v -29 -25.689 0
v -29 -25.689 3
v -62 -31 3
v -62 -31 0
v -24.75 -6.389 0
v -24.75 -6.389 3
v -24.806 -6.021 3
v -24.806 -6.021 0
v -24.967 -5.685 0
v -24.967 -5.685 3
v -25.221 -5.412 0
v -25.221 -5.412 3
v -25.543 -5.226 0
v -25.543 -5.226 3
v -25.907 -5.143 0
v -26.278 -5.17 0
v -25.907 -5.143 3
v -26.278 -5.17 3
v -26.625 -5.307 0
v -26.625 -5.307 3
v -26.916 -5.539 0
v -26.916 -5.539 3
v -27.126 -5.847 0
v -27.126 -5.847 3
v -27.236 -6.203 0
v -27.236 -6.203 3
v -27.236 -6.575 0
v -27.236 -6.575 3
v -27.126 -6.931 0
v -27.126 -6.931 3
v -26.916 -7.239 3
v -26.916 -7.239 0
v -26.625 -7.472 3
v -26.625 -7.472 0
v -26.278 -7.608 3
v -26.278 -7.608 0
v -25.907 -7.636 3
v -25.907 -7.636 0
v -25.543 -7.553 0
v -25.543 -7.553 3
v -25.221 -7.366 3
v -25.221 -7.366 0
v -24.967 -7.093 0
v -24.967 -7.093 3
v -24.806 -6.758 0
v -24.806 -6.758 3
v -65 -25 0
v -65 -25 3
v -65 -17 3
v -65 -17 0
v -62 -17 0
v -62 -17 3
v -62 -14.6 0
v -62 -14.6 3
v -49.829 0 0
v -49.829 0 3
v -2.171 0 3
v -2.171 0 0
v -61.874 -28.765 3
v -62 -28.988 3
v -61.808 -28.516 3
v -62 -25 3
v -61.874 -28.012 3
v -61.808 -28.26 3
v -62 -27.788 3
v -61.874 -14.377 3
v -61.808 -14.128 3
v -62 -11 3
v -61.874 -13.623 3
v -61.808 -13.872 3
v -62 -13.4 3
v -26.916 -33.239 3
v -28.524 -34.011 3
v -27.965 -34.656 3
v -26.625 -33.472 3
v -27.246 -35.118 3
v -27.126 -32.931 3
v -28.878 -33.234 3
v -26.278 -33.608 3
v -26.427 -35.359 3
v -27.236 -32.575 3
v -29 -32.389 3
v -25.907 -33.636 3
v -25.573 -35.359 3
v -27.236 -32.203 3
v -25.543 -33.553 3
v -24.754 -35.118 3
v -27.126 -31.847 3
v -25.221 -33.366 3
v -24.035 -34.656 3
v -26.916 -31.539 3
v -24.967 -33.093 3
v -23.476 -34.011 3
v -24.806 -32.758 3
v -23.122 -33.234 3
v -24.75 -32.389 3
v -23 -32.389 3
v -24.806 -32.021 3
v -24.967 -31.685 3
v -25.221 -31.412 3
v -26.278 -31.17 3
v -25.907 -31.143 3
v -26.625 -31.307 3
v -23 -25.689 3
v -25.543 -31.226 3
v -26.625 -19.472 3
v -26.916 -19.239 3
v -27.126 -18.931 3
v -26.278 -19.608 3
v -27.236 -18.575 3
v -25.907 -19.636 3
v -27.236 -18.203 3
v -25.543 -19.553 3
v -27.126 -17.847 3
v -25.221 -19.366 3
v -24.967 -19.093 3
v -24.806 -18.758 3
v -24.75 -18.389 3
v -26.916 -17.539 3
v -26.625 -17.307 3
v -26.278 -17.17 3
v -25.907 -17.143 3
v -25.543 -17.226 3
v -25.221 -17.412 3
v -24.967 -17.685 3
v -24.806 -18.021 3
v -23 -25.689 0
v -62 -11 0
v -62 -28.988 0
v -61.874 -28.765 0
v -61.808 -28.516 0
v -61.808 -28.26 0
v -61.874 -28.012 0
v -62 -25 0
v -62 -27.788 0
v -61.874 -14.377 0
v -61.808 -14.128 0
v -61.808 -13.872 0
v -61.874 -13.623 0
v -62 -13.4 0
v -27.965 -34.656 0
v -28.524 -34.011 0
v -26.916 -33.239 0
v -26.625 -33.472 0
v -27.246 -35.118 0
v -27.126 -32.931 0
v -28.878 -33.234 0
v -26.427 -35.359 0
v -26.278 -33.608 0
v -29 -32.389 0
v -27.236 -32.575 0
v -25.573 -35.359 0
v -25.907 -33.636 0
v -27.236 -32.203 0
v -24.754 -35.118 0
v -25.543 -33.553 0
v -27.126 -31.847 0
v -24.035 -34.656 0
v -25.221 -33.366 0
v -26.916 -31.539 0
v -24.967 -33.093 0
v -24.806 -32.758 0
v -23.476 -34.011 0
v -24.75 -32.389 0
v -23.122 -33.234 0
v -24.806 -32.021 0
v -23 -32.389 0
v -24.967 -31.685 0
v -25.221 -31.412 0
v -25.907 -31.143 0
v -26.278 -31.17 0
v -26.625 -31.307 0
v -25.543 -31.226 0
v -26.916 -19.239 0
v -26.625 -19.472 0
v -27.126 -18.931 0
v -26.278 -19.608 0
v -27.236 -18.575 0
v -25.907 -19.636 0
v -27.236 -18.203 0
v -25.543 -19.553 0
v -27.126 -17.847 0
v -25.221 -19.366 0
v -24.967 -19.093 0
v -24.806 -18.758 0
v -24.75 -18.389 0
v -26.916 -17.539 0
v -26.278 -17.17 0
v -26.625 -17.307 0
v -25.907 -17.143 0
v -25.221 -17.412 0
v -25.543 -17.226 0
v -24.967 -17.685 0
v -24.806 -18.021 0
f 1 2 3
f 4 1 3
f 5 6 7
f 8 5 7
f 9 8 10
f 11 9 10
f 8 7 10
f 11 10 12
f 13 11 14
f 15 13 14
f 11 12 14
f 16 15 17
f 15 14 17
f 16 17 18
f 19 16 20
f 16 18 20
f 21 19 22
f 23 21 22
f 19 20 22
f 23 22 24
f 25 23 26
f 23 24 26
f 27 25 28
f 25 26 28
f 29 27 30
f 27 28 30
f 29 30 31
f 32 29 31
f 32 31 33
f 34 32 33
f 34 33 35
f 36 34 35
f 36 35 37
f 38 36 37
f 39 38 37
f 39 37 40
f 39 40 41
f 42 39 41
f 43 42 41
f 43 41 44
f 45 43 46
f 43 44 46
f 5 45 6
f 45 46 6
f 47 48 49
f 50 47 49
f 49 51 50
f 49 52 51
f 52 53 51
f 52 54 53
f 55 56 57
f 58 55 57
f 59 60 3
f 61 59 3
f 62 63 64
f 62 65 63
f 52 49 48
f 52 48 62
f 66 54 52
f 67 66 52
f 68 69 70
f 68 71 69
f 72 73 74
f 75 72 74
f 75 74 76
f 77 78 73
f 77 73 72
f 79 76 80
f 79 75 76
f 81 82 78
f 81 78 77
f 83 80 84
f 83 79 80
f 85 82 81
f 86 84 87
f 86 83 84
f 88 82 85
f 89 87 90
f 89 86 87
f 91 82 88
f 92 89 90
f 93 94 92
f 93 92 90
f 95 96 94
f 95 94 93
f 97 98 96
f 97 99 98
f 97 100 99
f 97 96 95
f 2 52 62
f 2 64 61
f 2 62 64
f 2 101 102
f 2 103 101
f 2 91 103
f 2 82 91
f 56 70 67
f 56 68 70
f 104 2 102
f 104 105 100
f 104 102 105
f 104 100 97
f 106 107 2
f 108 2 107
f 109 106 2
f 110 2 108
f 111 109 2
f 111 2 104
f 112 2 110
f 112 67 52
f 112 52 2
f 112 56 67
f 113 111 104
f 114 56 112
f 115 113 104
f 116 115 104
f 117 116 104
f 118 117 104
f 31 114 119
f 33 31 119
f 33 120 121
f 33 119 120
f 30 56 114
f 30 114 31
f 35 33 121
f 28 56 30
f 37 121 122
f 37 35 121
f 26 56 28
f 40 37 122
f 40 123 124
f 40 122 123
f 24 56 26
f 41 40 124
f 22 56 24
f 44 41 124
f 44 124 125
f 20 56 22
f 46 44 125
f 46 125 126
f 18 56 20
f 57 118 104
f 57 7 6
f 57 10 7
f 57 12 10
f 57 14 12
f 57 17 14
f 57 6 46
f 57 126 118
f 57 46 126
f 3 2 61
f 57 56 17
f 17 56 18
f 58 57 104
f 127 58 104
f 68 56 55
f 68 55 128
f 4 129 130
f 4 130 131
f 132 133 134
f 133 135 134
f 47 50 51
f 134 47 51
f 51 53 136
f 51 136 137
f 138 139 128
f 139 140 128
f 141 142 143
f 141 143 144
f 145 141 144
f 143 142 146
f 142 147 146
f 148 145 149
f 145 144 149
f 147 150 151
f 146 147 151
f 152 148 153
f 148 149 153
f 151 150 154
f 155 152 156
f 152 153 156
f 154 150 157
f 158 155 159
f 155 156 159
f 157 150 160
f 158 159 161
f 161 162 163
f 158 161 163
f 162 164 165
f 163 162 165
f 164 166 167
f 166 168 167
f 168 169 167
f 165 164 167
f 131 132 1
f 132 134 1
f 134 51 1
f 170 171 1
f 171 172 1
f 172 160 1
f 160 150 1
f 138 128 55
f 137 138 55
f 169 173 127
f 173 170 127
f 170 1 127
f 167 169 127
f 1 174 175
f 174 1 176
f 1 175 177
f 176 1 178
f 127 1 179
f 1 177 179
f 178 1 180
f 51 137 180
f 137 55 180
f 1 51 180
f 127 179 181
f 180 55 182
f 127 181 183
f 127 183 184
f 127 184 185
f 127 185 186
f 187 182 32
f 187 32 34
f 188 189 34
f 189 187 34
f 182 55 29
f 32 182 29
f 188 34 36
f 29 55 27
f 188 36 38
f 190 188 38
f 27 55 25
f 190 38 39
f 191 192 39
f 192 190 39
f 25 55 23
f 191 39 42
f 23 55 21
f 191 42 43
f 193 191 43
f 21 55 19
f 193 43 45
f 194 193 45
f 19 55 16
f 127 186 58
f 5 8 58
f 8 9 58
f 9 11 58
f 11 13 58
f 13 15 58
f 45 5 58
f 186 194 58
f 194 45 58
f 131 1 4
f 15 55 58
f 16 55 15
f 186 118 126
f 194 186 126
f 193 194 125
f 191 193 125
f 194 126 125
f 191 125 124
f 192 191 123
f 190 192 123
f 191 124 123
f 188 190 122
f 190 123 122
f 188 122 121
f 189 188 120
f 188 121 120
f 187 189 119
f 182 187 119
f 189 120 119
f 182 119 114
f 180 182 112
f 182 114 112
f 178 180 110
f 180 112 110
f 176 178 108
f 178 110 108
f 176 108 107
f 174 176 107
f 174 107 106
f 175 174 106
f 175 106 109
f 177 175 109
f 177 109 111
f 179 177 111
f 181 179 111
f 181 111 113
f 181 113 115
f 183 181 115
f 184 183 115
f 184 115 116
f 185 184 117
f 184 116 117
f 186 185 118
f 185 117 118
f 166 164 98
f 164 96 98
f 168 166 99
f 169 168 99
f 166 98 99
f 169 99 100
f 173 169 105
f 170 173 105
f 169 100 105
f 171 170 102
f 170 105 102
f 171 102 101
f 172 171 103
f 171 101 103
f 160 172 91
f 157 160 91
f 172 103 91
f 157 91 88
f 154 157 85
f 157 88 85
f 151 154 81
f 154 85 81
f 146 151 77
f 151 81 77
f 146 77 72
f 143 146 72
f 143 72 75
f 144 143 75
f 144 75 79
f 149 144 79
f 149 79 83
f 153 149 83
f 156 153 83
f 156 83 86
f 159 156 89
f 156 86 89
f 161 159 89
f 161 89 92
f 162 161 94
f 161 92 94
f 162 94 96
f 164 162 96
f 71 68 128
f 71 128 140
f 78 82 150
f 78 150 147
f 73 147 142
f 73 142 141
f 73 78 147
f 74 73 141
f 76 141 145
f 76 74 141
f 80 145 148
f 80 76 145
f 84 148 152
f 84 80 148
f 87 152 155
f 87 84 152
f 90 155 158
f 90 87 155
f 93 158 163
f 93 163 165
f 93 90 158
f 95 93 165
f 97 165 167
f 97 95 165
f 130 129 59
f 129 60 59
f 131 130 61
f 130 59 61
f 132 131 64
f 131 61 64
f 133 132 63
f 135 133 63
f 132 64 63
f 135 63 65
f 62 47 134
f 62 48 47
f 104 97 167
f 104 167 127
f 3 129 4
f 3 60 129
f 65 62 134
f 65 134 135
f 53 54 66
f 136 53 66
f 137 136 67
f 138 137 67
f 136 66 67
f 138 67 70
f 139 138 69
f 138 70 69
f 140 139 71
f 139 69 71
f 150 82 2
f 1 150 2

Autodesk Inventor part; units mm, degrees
ref_plane "YZ Plane" through (0, 0, 0) normal (1, 0, 0) x (0, 1, 0)
ref_plane "XZ Plane" through (0, 0, 0) normal (0, 1, 0) x (-1, 0, 0)
ref_plane "XY Plane" through (0, 0, 0) normal (0, 0, 1) x (1, 0, 0)
sketch "スケッチ1" plane through (0, 0, 0) normal (0, 0, 1) x (1, 0, 0)
  line L0 (0, 0) -> (-65, 0)
  line L1 (-65, 0) -> (-65, -60)
  line L2 (-65, -60) -> (0, -60)
  line L3 (0, -60) -> (0, 0)
  dimension "d0" = 65
  dimension "d1" = 60
extrude "押し出し1" add sketch "スケッチ1" along normal blind 3
sketch "スケッチ2" plane through (0, 0, 3) normal (0, 0, 1) x (1, 0, 0)
  line L0 (-29, -25.6891) -> (-49.829, 0)
  line L1 (-2.171, 0) -> (-23, -25.6891)
  line L2 (-62, -31) -> (-65, -31)
  line L3 (-65, -31) -> (-65, -25)
  line L4 (-65, -25) -> (-62, -25)
  line L5 (-62, -25) -> (-62, -31)
  line L6 (-62, -17) -> (-65, -17)
  line L7 (-65, -17) -> (-65, -11)
  line L8 (-65, -11) -> (-62, -11)
  line L9 (-62, -11) -> (-62, -17)
  line L10 (-65, 4) -> (-62, 4)
  line L11 (-62, 4) -> (-62, 0)
  line L12 (-62, 0) -> (-65, 0)
  line L13 (-65, -4) -> (-65, 0)
  line L14 (-62, -4) -> (-65, -4)
  line L15 (-62, 0) -> (-62, -4)
  line L16 (-65, 0) -> (-65, 4)
  line L17 (-65, -40) -> (-62, -40)
  line L18 (0, 0) -> (0, -60) projected
  line L19 (0, -60) -> (-65, -60) projected
  line L20 (-65, -60) -> (-65, 0) projected
  line L21 (-65, 0) -> (0, 0) projected
  line L22 (-49.829, 0) -> (-62, -11)
  arc A0 (-29, -32.3891) -> (-23, -32.3891) centre (-26, -32.3891) ccw
  line L23 (-26, -32.3891) -> (-26, -29.3891) construction
  circle A1 centre (-26, -32.3891) radius 1.25
  line L24 (-23, -32.3891) -> (-23, -25.6891)
  line L25 (-29, -32.3891) -> (-29, -25.6891)
  circle A2 centre (-26, -18.3891) radius 1.25
  circle A3 centre (-26, -6.3891) radius 1.25
  line L26 (-29, -25.6891) -> (-62, -31)
  dimension "d4" = 6
  dimension "d5" = 2.5
  dimension "d6" = 3
  dimension "d7" = 2.5
  dimension "d8" = 2.5
  dimension "d9" = 14
  dimension "d10" = 26
extrude "押し出し2" cut sketch "スケッチ2" against normal blind 3 contours L26 L5 L4 L20 L6 L9 L22 L0 | L0 L21 L1 L24 A0 L25 keep common part
sketch "スケッチ3" plane through (0, 0, 3) normal (0, 0, 1) x (1, 0, 0)
  circle A0 centre (-26, -6.3891) radius 1.25 projected
  circle A1 centre (-26, -18.3891) radius 1.25 projected
  circle A2 centre (-26, -32.3891) radius 1.25 projected
  line L0 (-62, -25) -> (-65, -25) projected
  line L1 (-65, -25) -> (-65, -17) projected
  line L2 (-65, -17) -> (-62, -17) projected
  line L3 (-62, -17) -> (-62, -11) projected
  line L4 (-62, -11) -> (-49.829, 0) projected
  line L5 (-49.829, 0) -> (-2.171, 0) projected
  line L6 (-2.171, 0) -> (-23, -25.6891) projected
  line L7 (-23, -25.6891) -> (-23, -32.3891) projected
  arc A3 (-29, -32.3891) -> (-23, -32.3891) centre (-26, -32.3891) ccw projected
  line L8 (-29, -32.3891) -> (-29, -25.6891) projected
  line L9 (-29, -25.6891) -> (-62, -31) projected
  line L10 (-62, -31) -> (-62, -25) projected
  arc A4 (-62, -28.9881) -> (-62, -27.7881) centre (-62.8, -28.3881) ccw
  arc A5 (-62, -14.6) -> (-62, -13.4) centre (-62.8, -14) ccw
  point P0 (0, 0)
  dimension "d13" = 2
  dimension "d14" = 2
  dimension "d15" = 3
  dimension "d16" = 3.3881
  dimension "d17" = 0.8
extrude "押し出し3" cut sketch "スケッチ3" against normal blind 3 contours A4 L10 | L3 A5
sketch "スケッチ4" plane through (0, 0, 3) normal (0, 0, 1) x (1, 0, 0)
  circle A0 centre (-26, -6.3891) radius 1.25 projected
  circle A1 centre (-26, -18.3891) radius 1.25 projected
  circle A2 centre (-26, -32.3891) radius 1.25 projected
  line L0 (-29, -32.3891) -> (-29, -25.6891) projected
  line L1 (-29, -25.6891) -> (-62, -31) projected
  line L2 (-62, -31) -> (-62, -28.9881) projected
  arc A3 (-62, -28.9881) -> (-62, -27.7881) centre (-62.8, -28.3881) ccw projected
  line L3 (-62, -27.7881) -> (-62, -25) projected
  line L4 (-62, -25) -> (-65, -25) projected
  line L5 (-65, -25) -> (-65, -17) projected
  line L6 (-65, -17) -> (-62, -17) projected
  line L7 (-62, -17) -> (-62, -14.6) projected
  arc A4 (-62, -14.6) -> (-62, -13.4) centre (-62.8, -14) ccw projected
  line L8 (-62, -13.4) -> (-62, -11) projected
  line L9 (-62, -11) -> (-49.829, 0) projected
  line L10 (-49.829, 0) -> (-2.171, 0) projected
  line L11 (-2.171, 0) -> (-23, -25.6891) projected
  line L12 (-23, -25.6891) -> (-23, -32.3891) projected
  arc A5 (-29, -32.3891) -> (-23, -32.3891) centre (-26, -32.3891) ccw projected
  line L13 (-58, -25) -> (-61, -25)
  line L14 (-61, -25) -> (-61, -17)
  line L15 (-61, -17) -> (-58, -17)
  line L16 (-65, -17) -> (-65, -25) projected
  line L17 (-62, -25) -> (-65, -25) projected
  circle A6 centre (-58.8, -28.3881) radius 1
  circle A7 centre (-58.8, -14) radius 1
  arc A8 (-62, -14.6) -> (-62, -13.4) centre (-62.8, -14) ccw projected
  line L18 (-49.829, 0) -> (-58, -11)
  line L19 (-58, -31) -> (-29, -25.6891)
  line L20 (-29, -25.6891) -> (-49.829, 0)
  line L21 (-58, -31) -> (-58, -28.9881)
  line L22 (-58, -27.7881) -> (-58, -25)
  line L23 (-58, -17) -> (-58, -14.6)
  line L24 (-58, -13.4) -> (-58, -11)
  dimension "d26" = 3
  dimension "d27" = 6
  dimension "d28" = 6
  dimension "d29" = 4
sketch "スケッチ5" plane through (0, 0, 3) normal (0, 0, 1) x (1, 0, 0)
  circle A0 centre (-26, -6.3891) radius 1.25 projected
  circle A1 centre (-26, -18.3891) radius 1.25 projected
  circle A2 centre (-26, -32.3891) radius 1.25 projected
  line L0 (-29, -32.3891) -> (-29, -25.6891) projected
  line L1 (-29, -25.6891) -> (-62, -31) projected
  line L2 (-62, -31) -> (-62, -28.9881) projected
  arc A3 (-62, -28.9881) -> (-62, -27.7881) centre (-62.8, -28.3881) ccw projected
  line L3 (-62, -27.7881) -> (-62, -25) projected
  line L4 (-62, -25) -> (-65, -25) projected
  line L5 (-65, -25) -> (-65, -17) projected
  line L6 (-65, -17) -> (-62, -17) projected
  line L7 (-62, -17) -> (-62, -14.6) projected
  arc A4 (-62, -14.6) -> (-62, -13.4) centre (-62.8, -14) ccw projected
  line L8 (-62, -13.4) -> (-62, -11) projected
  line L9 (-62, -11) -> (-49.829, 0) projected
  line L10 (-49.829, 0) -> (-2.171, 0) projected
  line L11 (-2.171, 0) -> (-23, -25.6891) projected
  line L12 (-23, -25.6891) -> (-23, -32.3891) projected
  arc A5 (-29, -32.3891) -> (-23, -32.3891) centre (-26, -32.3891) ccw projected
  circle A6 centre (-26, -6.3891) radius 1.25 projected
  circle A7 centre (-26, -18.3891) radius 1.25 projected
  circle A8 centre (-26, -32.3891) radius 1.25 projected
  line L13 (-29, -32.3891) -> (-29, -25.6891) projected
  line L14 (-29, -25.6891) -> (-62, -31) projected
  line L15 (-62, -31) -> (-62, -28.9881) projected
  arc A9 (-62, -28.9881) -> (-62, -27.7881) centre (-62.8, -28.3881) ccw projected
  line L16 (-62, -27.7881) -> (-62, -25) projected
  line L17 (-62, -25) -> (-65, -25) projected
  line L18 (-65, -25) -> (-65, -17) projected
  line L19 (-65, -17) -> (-62, -17) projected
  line L20 (-62, -17) -> (-62, -14.6) projected
  arc A10 (-62, -14.6) -> (-62, -13.4) centre (-62.8, -14) ccw projected
  line L21 (-62, -13.4) -> (-62, -11) projected
  line L22 (-62, -11) -> (-49.829, 0) projected
  line L23 (-49.829, 0) -> (-2.171, 0) projected
  line L24 (-2.171, 0) -> (-23, -25.6891) projected
  line L25 (-23, -25.6891) -> (-23, -32.3891) projected
  arc A11 (-29, -32.3891) -> (-23, -32.3891) centre (-26, -32.3891) ccw projected
  circle A12 centre (-26, -6.3891) radius 1.25 projected
  circle A13 centre (-26, -18.3891) radius 1.25 projected
  circle A14 centre (-26, -32.3891) radius 1.25 projected
  line L26 (-29, -32.3891) -> (-29, -25.6891) projected
  line L27 (-29, -25.6891) -> (-62, -31) projected
  line L28 (-62, -31) -> (-62, -28.9881) projected
  arc A15 (-62, -28.9881) -> (-62, -27.7881) centre (-62.8, -28.3881) ccw projected
  line L29 (-62, -27.7881) -> (-62, -25) projected
  line L30 (-62, -25) -> (-65, -25) projected
  line L31 (-65, -25) -> (-65, -17) projected
  line L32 (-65, -17) -> (-62, -17) projected
  line L33 (-62, -17) -> (-62, -14.6) projected
  arc A16 (-62, -14.6) -> (-62, -13.4) centre (-62.8, -14) ccw projected
  line L34 (-62, -13.4) -> (-62, -11) projected
  line L35 (-62, -11) -> (-49.829, 0) projected
  line L36 (-49.829, 0) -> (-2.171, 0) projected
  line L37 (-2.171, 0) -> (-23, -25.6891) projected
  line L38 (-23, -25.6891) -> (-23, -32.3891) projected
  arc A17 (-29, -32.3891) -> (-23, -32.3891) centre (-26, -32.3891) ccw projected
  arc A18 (-62, -14.6) -> (-62, -13.4) centre (-62.8, -14) ccw projected
  line L39 (-62, -17) -> (-62, -14.6) projected
  line L40 (-65, -17) -> (-62, -17) projected
  line L41 (-65, -17) -> (-65, -25) projected
  line L42 (-62, -25) -> (-65, -25) projected
  line L43 (-62, -27.7881) -> (-62, -25) projected
  arc A19 (-62, -28.9881) -> (-62, -27.7881) centre (-62.8, -28.3881) ccw projected
  line L44 (-62, -31) -> (-62, -28.9881) projected
  line L45 (-29, -25.6891) -> (-62, -31) projected
  line L46 (-29, -32.3891) -> (-29, -25.6891) projected
  arc A20 (-29, -32.3891) -> (-23, -32.3891) centre (-26, -32.3891) ccw projected
  line L47 (-23, -25.6891) -> (-23, -32.3891) projected
  line L48 (-2.171, 0) -> (-23, -25.6891) projected
  line L49 (-2.171, 0) -> (-49.829, 0) projected
  line L50 (-62, -11) -> (-49.829, 0) projected
  line L51 (-62, -13.4) -> (-62, -11) projected
  circle A21 centre (-26, -32.3891) radius 1.25 projected
  circle A22 centre (-26, -18.3891) radius 1.25 projected
  circle A23 centre (-26, -6.3891) radius 1.25 projected
  line L52 (-29, -25.6891) -> (-49.829, 0)
  line L53 (-29, -25.6891) -> (-65.9346, -36.6422)
  line L54 (-65.9346, -36.6422) -> (-73.9425, -10.887)
  line L55 (-73.9425, -10.887) -> (-49.829, 0)
  point P0 (0, 0)
extrude "押し出し4" [suppressed]
extrude "押し出し5" [suppressed]
sketch "スケッチ6" plane through (0, 0, 0) normal (0, 0, -1) x (-1, 0, 0)
  circle A0 centre (26, -32.3891) radius 1.25 projected
  circle A1 centre (26, -18.3891) radius 1.25 projected
  circle A2 centre (26, -6.3891) radius 1.25 projected
  arc A3 (62, -13.4) -> (62, -14.6) centre (62.8, -14) ccw projected
  line L0 (62, -11) -> (62, -13.4) projected
  line L1 (49.829, 0) -> (62, -11) projected
  line L2 (2.171, 0) -> (49.829, 0) projected
  line L3 (23, -25.6891) -> (2.171, 0) projected
  line L4 (23, -32.3891) -> (23, -25.6891) projected
  arc A4 (23, -32.3891) -> (29, -32.3891) centre (26, -32.3891) ccw projected
  line L5 (29, -25.6891) -> (29, -32.3891) projected
  line L6 (62, -31) -> (29, -25.6891) projected
  line L7 (62, -28.9881) -> (62, -31) projected
  arc A5 (62, -27.7881) -> (62, -28.9881) centre (62.8, -28.3881) ccw projected
  line L8 (62, -25) -> (62, -27.7881) projected
  line L9 (65, -25) -> (62, -25) projected
  line L10 (65, -17) -> (65, -25) projected
  line L11 (62, -17) -> (65, -17) projected
  line L12 (62, -14.6) -> (62, -17) projected
  point P0 (0, 0)
equation "\"d28\" = d27"
properties part number "handPlate"
